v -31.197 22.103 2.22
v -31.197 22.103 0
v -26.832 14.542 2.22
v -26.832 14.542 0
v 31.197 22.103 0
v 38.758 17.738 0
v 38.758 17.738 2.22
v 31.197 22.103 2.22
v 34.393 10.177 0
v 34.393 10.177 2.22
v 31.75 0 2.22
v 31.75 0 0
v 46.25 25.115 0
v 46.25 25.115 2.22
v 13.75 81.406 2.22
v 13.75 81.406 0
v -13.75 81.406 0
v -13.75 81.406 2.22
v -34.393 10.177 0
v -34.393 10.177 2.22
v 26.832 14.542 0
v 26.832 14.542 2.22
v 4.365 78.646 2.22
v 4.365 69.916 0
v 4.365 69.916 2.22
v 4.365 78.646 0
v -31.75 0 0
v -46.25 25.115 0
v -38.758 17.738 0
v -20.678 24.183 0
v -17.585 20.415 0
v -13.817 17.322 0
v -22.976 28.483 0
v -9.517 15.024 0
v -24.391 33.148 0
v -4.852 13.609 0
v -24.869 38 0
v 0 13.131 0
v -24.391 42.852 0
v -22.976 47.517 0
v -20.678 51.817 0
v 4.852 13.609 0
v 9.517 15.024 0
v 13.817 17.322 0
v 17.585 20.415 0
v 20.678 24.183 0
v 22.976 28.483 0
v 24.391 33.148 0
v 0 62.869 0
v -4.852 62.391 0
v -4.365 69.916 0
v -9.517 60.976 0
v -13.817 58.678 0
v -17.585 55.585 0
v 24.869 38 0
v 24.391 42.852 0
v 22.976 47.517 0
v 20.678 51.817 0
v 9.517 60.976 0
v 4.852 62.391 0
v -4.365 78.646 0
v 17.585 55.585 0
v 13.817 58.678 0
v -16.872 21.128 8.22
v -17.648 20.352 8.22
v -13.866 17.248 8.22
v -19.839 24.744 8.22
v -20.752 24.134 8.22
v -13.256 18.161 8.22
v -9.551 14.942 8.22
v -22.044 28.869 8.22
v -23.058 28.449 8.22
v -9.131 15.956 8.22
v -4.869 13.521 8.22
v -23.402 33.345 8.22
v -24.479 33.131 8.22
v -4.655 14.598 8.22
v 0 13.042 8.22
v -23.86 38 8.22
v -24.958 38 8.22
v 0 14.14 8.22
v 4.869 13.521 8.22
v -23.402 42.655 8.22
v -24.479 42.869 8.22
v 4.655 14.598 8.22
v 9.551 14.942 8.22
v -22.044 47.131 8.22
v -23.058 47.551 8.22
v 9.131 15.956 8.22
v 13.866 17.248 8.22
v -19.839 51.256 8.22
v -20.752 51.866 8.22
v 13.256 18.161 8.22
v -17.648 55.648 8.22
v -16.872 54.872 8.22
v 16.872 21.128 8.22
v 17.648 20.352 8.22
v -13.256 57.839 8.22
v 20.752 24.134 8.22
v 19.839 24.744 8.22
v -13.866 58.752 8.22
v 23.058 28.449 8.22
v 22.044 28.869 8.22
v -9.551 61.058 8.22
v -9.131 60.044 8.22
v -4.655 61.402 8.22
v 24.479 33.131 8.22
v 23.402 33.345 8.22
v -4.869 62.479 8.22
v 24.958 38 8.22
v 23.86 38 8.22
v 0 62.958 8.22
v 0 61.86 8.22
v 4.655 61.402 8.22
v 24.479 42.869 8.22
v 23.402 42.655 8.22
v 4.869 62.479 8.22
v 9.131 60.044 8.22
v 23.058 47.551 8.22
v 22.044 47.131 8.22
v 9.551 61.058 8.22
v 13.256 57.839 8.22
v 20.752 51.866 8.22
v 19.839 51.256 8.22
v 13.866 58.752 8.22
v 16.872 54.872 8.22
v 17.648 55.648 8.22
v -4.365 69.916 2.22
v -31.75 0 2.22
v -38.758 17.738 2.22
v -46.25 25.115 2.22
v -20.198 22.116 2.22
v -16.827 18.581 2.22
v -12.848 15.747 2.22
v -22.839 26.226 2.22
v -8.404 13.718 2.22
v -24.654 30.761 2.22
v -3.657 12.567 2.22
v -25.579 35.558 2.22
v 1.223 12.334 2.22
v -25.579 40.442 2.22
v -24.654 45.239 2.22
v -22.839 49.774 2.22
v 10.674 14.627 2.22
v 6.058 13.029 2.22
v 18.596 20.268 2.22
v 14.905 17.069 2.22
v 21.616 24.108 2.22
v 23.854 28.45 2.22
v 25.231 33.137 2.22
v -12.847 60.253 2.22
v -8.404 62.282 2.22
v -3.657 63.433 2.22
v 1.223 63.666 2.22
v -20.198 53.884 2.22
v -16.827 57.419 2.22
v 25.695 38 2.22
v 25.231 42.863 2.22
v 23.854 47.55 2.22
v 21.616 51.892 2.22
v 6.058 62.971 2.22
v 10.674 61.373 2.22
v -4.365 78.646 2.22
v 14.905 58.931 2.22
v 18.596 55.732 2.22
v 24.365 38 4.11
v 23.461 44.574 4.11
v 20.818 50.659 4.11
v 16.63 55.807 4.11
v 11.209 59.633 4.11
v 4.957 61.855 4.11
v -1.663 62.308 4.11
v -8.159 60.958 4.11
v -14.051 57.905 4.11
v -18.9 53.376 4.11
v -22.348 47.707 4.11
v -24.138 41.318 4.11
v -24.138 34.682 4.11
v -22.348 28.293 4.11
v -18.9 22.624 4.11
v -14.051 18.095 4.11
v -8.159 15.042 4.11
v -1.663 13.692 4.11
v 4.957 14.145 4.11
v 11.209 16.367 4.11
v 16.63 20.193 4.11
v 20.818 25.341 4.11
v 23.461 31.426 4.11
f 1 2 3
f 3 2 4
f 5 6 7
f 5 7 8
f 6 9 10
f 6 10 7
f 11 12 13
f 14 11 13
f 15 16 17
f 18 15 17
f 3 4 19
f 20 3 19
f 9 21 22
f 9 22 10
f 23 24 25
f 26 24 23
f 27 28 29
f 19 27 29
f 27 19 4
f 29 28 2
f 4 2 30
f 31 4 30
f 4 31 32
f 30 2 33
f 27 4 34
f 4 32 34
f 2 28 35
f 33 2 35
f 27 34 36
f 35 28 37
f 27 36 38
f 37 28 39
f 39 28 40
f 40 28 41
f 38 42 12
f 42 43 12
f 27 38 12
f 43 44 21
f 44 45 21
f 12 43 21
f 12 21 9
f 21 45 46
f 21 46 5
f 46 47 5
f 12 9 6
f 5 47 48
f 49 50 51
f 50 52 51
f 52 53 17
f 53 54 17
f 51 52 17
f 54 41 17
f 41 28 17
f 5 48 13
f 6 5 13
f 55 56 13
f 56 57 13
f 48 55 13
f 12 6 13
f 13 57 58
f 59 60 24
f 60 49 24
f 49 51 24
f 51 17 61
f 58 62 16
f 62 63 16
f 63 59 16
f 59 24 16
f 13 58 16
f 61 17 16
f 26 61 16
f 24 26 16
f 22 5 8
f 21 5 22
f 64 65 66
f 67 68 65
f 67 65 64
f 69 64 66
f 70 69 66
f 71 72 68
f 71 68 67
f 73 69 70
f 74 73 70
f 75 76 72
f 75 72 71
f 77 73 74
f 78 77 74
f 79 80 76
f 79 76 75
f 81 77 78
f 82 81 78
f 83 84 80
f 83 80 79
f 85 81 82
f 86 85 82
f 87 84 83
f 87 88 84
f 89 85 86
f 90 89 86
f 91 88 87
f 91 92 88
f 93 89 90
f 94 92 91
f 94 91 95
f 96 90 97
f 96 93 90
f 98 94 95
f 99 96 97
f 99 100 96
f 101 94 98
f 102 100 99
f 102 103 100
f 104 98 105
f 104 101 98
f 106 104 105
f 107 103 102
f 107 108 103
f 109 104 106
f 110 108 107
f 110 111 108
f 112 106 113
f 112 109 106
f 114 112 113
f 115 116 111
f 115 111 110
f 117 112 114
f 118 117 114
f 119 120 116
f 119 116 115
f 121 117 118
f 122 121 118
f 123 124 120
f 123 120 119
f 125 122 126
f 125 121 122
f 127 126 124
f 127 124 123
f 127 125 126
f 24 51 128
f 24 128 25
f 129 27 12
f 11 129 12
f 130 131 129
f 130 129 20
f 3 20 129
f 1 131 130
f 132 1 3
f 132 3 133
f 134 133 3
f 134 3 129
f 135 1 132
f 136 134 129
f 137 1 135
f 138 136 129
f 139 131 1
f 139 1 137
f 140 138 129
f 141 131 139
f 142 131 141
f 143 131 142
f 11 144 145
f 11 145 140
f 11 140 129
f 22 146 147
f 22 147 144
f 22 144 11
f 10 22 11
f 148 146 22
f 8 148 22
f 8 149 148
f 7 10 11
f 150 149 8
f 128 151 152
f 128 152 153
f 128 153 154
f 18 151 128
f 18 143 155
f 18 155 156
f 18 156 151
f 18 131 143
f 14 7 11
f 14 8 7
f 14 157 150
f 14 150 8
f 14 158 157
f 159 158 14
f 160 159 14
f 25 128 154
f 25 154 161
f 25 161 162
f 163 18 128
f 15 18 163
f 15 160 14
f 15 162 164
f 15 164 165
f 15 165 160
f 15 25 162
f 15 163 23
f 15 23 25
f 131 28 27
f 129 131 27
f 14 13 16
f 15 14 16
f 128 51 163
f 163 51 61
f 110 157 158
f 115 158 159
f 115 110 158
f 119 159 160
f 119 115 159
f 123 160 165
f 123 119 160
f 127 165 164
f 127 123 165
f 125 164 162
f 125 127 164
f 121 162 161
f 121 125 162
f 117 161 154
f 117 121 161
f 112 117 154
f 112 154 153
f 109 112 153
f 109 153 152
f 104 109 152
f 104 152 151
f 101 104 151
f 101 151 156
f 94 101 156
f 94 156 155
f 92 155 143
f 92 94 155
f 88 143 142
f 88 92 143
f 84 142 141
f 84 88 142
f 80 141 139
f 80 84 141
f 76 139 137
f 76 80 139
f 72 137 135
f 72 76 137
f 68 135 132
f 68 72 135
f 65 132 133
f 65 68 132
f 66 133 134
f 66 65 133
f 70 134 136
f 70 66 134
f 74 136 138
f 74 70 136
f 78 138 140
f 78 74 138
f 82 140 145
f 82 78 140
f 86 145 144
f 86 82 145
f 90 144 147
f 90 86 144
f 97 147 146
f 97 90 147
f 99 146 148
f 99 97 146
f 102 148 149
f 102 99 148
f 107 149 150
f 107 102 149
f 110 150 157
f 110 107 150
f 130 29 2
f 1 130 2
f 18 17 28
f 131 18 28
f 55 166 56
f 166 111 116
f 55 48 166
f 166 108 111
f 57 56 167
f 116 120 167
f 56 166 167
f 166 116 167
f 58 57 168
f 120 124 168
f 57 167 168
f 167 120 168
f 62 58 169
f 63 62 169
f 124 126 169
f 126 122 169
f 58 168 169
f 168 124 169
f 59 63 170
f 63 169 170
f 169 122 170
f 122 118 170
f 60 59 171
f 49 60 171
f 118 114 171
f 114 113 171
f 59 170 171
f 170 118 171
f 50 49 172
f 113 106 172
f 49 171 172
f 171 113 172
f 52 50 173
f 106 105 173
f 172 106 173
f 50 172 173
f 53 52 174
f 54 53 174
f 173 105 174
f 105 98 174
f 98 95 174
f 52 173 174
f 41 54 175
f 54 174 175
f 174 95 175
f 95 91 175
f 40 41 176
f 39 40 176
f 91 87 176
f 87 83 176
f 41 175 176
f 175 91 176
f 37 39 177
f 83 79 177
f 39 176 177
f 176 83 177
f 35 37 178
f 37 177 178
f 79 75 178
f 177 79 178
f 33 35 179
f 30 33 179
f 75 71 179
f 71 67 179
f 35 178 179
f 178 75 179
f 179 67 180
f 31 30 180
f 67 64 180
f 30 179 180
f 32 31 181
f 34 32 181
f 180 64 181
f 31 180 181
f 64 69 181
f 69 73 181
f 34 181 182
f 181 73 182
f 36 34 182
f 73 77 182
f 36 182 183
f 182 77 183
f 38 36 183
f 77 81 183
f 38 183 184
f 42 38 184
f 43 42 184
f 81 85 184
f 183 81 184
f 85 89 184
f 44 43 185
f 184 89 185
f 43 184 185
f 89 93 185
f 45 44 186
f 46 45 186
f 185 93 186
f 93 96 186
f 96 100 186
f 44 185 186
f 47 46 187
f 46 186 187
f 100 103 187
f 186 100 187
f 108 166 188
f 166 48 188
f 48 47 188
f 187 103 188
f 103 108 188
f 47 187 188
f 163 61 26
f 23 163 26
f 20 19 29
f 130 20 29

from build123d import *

# Parameters (mm, degrees)
SKETCH1_W           = 8.73
SKETCH1_H           = 8.73
BOSS_EXTRUDE1_DEPTH = 2.22
SKETCH2_R           = 25.695
BOSS_EXTRUDE2_DEPTH = 6
BOSS_EXTRUDE2_TAPER = 7
SKETCH3_R           = 23.86
CUT_EXTRUDE1_DEPTH  = 8.22
CUT_EXTRUDE1_DRAFT  = 7


with BuildPart() as part:
    # Sketch1 → Boss-Extrude1 (new body)
    with BuildSketch(Plane.XY):
        Polygon((-31.75, 0), (31.75, 0), (46.25, 25.11473671), (13.75, 81.406387956), (-13.75, 81.406387956), (-46.25, 25.11473671), align=None)
        Polygon((-34.392628869, 10.177167467), (-38.757628869, 17.737569242), (-31.197227094, 22.102569242), (-26.832227094, 14.542167467), align=None, mode=Mode.SUBTRACT)
        with Locations((0, 74.281387956)):
            Rectangle(SKETCH1_W, SKETCH1_H, mode=Mode.SUBTRACT)
        Polygon((34.392628869, 10.177167467), (38.757628869, 17.737569242), (31.197227094, 22.102569242), (26.832227094, 14.542167467), align=None, mode=Mode.SUBTRACT)
    extrude(amount=BOSS_EXTRUDE1_DEPTH)

    # Sketch2 → Boss-Extrude2 (add)
    with BuildSketch(Plane.XY.offset(2.22)):
        with Locations((0, 38)):
            Circle(SKETCH2_R)
    extrude(amount=BOSS_EXTRUDE2_DEPTH, taper=BOSS_EXTRUDE2_TAPER)


with BuildPart() as cut_extrude1_tool:
    # Sketch3 → Cut-Extrude1 (with draft: the straight prism first)
    with BuildSketch(Plane.XY.offset(8.22)):
        with Locations((0, 38)):
            Circle(SKETCH3_R)
    extrude(amount=-CUT_EXTRUDE1_DEPTH)
    # Cut-Extrude1: the draft: its side faces are tilted about the plane it starts from
    cut_extrude1_sides = [cut_extrude1_tool.faces().sort_by_distance(p)[0] for p in [
        (-23.86, 38, 4.11),
    ]]
    draft(cut_extrude1_sides, Plane.XY.offset(8.22), CUT_EXTRUDE1_DRAFT)


with BuildPart() as part_1:
    add(part.part)

    # Cut-Extrude1: cut by cut_extrude1_tool
    add(cut_extrude1_tool.part, mode=Mode.SUBTRACT)


solid = part_1.part
